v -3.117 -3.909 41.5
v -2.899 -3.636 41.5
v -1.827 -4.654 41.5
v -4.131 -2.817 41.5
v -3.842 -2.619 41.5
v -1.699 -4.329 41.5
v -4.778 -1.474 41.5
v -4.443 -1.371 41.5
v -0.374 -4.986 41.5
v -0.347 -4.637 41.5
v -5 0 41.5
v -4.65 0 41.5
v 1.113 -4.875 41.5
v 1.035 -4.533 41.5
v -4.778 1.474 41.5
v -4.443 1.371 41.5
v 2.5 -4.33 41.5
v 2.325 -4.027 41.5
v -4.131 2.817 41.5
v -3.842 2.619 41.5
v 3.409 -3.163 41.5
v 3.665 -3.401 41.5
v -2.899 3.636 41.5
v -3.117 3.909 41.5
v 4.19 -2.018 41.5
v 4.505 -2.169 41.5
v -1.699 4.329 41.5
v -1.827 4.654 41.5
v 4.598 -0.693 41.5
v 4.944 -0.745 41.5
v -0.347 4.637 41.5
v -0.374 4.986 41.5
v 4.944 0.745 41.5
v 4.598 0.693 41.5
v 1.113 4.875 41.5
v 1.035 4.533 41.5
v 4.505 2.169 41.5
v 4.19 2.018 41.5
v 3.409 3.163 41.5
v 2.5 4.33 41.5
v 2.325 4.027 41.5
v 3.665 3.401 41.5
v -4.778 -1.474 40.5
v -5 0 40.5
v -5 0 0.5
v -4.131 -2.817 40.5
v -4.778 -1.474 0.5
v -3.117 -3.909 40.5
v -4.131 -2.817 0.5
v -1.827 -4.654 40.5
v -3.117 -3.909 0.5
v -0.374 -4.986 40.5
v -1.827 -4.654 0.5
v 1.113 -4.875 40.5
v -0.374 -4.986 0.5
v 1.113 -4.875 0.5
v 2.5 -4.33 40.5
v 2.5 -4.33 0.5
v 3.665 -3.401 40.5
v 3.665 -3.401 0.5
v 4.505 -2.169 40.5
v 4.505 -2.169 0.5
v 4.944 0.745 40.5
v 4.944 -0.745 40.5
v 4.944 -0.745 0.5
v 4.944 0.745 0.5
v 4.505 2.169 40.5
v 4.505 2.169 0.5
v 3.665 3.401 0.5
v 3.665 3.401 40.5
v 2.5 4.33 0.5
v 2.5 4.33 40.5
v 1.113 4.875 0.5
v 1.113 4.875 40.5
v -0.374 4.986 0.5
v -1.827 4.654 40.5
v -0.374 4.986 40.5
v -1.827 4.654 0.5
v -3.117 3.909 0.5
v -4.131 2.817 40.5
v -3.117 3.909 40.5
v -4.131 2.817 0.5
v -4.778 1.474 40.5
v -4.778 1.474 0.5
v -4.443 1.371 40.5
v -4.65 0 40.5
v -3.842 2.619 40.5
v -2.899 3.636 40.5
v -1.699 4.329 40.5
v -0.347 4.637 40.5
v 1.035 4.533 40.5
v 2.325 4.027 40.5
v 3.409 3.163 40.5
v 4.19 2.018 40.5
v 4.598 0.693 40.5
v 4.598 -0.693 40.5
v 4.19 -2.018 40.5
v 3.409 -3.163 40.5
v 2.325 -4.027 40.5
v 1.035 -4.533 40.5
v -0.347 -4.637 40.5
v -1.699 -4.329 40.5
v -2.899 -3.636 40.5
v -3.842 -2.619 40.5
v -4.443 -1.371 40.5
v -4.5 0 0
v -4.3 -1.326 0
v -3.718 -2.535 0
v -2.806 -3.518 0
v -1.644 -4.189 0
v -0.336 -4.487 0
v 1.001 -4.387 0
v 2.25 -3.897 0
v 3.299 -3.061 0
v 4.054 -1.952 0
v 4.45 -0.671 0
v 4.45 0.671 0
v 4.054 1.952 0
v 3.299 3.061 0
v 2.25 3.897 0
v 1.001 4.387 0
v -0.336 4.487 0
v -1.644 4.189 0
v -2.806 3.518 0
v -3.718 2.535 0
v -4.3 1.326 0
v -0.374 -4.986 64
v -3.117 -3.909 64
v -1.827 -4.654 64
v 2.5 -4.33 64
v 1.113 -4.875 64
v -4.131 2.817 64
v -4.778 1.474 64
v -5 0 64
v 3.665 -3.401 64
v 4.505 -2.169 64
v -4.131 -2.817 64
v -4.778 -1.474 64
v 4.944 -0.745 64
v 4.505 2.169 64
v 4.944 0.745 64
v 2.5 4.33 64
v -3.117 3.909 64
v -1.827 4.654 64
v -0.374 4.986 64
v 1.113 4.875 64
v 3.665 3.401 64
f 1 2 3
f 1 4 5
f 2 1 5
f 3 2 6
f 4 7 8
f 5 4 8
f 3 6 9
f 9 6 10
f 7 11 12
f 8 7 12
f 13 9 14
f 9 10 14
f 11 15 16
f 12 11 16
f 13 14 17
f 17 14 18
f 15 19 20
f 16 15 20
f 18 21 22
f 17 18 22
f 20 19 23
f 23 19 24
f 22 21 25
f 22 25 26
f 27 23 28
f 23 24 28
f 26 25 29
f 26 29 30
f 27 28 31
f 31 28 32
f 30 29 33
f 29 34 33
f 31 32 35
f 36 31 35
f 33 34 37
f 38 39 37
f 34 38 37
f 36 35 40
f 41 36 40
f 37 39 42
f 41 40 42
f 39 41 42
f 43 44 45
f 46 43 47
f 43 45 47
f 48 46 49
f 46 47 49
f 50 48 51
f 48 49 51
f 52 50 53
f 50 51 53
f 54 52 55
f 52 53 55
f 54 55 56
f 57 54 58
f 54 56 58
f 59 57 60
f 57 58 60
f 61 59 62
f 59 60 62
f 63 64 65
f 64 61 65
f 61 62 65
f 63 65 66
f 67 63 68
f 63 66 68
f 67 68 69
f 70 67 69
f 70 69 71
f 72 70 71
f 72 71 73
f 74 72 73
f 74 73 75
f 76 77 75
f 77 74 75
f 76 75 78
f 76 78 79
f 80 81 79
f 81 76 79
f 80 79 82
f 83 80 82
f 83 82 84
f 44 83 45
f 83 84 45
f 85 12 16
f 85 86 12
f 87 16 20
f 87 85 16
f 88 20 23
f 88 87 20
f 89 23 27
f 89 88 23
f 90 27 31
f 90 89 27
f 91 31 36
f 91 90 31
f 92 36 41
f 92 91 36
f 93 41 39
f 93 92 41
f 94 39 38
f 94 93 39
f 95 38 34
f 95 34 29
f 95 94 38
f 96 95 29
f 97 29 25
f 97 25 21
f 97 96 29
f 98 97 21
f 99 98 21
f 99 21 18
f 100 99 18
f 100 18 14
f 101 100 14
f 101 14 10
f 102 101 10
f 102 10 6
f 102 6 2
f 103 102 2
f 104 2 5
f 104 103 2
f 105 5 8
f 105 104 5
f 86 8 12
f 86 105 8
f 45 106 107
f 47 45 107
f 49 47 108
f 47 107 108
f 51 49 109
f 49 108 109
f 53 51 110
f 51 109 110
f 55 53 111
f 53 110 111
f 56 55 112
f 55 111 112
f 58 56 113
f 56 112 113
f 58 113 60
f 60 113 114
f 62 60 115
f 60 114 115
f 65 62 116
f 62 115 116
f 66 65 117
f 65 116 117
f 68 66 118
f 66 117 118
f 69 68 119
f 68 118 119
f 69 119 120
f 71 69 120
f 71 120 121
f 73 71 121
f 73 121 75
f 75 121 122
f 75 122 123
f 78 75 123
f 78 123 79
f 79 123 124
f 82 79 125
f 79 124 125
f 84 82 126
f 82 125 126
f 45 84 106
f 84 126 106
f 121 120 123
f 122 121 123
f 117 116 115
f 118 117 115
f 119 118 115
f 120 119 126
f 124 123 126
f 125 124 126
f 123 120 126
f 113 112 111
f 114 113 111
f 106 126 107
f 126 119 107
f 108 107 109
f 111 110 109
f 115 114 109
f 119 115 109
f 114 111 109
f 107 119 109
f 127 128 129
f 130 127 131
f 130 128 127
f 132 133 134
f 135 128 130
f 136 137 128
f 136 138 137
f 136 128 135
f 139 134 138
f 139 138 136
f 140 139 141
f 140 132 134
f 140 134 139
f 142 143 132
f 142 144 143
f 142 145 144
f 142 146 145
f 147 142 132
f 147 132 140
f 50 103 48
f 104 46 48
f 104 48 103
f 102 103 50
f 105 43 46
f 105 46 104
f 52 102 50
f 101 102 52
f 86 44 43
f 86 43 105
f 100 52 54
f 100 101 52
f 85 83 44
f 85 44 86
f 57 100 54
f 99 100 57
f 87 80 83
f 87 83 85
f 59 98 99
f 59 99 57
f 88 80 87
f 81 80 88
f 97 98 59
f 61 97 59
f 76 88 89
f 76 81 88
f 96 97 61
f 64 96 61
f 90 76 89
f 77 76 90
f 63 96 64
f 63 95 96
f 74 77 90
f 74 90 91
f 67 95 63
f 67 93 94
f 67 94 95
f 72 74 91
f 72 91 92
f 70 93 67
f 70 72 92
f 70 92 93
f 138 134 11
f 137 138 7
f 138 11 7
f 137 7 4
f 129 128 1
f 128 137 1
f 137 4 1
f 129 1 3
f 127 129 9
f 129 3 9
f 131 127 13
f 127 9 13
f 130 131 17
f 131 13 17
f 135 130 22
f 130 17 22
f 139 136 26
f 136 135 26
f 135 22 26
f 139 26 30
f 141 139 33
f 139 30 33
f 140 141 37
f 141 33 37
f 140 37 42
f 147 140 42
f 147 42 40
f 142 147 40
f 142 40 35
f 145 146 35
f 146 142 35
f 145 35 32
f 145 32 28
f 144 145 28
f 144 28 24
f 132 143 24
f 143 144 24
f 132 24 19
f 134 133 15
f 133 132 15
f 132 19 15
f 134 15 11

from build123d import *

# Parameters (mm, degrees)
SKETCH_1_R          = 5
EXTRUDE_1_DEPTH     = 104
SKETCH_2_W          = 3.498862739
SKETCH_2_H          = 1
CHAMFER_1_SIZE      = 0.5
SKETCH_4_W          = 44.49282487
SKETCH_4_H          = 52.981234512
CUT_EXTRUDE_2_DEPTH = 5


with BuildPart() as part:
    # 草图1 → 拉伸1 (new body)
    with BuildSketch(Plane.XY):
        with Locations(Location((0, 0, 0), (0, 0, 180))):
            Circle(SKETCH_1_R)
    extrude(amount=EXTRUDE_1_DEPTH)

    # 草图2 → 切除-旋转1 (revolve, cut)
    with BuildSketch(Plane(origin=(0, 0, 0), x_dir=(1, 0, 0), z_dir=(0, 1, 0)), mode=Mode.PRIVATE) as cut_revolve_1_sk:
        with Locations((6.39943137, -41)):
            Rectangle(SKETCH_2_W, SKETCH_2_H)
    revolve(cut_revolve_1_sk.sketch.rotate(Axis((0, 0, 104), (0, 0, -1)), 180), axis=Axis((0, 0, 104), (0, 0, -1)), mode=Mode.SUBTRACT)

    # 倒角1
    chamfer_1_edges = [part.edges().sort_by_distance(p)[0] for p in [
        (5, 0, 0),
        (5, 0, 104),
    ]]
    chamfer(chamfer_1_edges, length=CHAMFER_1_SIZE)

    # 草图4 → 拉伸2 (cut, symmetric)
    with BuildSketch(Plane(origin=(0, 0, 0), x_dir=(1, 0, 0), z_dir=(0, 1, 0))):
        with Locations((6.93564623, -90.490617256)):
            Rectangle(SKETCH_4_W, SKETCH_4_H)
    extrude(amount=CUT_EXTRUDE_2_DEPTH, both=True, mode=Mode.SUBTRACT)


solid = part.part
